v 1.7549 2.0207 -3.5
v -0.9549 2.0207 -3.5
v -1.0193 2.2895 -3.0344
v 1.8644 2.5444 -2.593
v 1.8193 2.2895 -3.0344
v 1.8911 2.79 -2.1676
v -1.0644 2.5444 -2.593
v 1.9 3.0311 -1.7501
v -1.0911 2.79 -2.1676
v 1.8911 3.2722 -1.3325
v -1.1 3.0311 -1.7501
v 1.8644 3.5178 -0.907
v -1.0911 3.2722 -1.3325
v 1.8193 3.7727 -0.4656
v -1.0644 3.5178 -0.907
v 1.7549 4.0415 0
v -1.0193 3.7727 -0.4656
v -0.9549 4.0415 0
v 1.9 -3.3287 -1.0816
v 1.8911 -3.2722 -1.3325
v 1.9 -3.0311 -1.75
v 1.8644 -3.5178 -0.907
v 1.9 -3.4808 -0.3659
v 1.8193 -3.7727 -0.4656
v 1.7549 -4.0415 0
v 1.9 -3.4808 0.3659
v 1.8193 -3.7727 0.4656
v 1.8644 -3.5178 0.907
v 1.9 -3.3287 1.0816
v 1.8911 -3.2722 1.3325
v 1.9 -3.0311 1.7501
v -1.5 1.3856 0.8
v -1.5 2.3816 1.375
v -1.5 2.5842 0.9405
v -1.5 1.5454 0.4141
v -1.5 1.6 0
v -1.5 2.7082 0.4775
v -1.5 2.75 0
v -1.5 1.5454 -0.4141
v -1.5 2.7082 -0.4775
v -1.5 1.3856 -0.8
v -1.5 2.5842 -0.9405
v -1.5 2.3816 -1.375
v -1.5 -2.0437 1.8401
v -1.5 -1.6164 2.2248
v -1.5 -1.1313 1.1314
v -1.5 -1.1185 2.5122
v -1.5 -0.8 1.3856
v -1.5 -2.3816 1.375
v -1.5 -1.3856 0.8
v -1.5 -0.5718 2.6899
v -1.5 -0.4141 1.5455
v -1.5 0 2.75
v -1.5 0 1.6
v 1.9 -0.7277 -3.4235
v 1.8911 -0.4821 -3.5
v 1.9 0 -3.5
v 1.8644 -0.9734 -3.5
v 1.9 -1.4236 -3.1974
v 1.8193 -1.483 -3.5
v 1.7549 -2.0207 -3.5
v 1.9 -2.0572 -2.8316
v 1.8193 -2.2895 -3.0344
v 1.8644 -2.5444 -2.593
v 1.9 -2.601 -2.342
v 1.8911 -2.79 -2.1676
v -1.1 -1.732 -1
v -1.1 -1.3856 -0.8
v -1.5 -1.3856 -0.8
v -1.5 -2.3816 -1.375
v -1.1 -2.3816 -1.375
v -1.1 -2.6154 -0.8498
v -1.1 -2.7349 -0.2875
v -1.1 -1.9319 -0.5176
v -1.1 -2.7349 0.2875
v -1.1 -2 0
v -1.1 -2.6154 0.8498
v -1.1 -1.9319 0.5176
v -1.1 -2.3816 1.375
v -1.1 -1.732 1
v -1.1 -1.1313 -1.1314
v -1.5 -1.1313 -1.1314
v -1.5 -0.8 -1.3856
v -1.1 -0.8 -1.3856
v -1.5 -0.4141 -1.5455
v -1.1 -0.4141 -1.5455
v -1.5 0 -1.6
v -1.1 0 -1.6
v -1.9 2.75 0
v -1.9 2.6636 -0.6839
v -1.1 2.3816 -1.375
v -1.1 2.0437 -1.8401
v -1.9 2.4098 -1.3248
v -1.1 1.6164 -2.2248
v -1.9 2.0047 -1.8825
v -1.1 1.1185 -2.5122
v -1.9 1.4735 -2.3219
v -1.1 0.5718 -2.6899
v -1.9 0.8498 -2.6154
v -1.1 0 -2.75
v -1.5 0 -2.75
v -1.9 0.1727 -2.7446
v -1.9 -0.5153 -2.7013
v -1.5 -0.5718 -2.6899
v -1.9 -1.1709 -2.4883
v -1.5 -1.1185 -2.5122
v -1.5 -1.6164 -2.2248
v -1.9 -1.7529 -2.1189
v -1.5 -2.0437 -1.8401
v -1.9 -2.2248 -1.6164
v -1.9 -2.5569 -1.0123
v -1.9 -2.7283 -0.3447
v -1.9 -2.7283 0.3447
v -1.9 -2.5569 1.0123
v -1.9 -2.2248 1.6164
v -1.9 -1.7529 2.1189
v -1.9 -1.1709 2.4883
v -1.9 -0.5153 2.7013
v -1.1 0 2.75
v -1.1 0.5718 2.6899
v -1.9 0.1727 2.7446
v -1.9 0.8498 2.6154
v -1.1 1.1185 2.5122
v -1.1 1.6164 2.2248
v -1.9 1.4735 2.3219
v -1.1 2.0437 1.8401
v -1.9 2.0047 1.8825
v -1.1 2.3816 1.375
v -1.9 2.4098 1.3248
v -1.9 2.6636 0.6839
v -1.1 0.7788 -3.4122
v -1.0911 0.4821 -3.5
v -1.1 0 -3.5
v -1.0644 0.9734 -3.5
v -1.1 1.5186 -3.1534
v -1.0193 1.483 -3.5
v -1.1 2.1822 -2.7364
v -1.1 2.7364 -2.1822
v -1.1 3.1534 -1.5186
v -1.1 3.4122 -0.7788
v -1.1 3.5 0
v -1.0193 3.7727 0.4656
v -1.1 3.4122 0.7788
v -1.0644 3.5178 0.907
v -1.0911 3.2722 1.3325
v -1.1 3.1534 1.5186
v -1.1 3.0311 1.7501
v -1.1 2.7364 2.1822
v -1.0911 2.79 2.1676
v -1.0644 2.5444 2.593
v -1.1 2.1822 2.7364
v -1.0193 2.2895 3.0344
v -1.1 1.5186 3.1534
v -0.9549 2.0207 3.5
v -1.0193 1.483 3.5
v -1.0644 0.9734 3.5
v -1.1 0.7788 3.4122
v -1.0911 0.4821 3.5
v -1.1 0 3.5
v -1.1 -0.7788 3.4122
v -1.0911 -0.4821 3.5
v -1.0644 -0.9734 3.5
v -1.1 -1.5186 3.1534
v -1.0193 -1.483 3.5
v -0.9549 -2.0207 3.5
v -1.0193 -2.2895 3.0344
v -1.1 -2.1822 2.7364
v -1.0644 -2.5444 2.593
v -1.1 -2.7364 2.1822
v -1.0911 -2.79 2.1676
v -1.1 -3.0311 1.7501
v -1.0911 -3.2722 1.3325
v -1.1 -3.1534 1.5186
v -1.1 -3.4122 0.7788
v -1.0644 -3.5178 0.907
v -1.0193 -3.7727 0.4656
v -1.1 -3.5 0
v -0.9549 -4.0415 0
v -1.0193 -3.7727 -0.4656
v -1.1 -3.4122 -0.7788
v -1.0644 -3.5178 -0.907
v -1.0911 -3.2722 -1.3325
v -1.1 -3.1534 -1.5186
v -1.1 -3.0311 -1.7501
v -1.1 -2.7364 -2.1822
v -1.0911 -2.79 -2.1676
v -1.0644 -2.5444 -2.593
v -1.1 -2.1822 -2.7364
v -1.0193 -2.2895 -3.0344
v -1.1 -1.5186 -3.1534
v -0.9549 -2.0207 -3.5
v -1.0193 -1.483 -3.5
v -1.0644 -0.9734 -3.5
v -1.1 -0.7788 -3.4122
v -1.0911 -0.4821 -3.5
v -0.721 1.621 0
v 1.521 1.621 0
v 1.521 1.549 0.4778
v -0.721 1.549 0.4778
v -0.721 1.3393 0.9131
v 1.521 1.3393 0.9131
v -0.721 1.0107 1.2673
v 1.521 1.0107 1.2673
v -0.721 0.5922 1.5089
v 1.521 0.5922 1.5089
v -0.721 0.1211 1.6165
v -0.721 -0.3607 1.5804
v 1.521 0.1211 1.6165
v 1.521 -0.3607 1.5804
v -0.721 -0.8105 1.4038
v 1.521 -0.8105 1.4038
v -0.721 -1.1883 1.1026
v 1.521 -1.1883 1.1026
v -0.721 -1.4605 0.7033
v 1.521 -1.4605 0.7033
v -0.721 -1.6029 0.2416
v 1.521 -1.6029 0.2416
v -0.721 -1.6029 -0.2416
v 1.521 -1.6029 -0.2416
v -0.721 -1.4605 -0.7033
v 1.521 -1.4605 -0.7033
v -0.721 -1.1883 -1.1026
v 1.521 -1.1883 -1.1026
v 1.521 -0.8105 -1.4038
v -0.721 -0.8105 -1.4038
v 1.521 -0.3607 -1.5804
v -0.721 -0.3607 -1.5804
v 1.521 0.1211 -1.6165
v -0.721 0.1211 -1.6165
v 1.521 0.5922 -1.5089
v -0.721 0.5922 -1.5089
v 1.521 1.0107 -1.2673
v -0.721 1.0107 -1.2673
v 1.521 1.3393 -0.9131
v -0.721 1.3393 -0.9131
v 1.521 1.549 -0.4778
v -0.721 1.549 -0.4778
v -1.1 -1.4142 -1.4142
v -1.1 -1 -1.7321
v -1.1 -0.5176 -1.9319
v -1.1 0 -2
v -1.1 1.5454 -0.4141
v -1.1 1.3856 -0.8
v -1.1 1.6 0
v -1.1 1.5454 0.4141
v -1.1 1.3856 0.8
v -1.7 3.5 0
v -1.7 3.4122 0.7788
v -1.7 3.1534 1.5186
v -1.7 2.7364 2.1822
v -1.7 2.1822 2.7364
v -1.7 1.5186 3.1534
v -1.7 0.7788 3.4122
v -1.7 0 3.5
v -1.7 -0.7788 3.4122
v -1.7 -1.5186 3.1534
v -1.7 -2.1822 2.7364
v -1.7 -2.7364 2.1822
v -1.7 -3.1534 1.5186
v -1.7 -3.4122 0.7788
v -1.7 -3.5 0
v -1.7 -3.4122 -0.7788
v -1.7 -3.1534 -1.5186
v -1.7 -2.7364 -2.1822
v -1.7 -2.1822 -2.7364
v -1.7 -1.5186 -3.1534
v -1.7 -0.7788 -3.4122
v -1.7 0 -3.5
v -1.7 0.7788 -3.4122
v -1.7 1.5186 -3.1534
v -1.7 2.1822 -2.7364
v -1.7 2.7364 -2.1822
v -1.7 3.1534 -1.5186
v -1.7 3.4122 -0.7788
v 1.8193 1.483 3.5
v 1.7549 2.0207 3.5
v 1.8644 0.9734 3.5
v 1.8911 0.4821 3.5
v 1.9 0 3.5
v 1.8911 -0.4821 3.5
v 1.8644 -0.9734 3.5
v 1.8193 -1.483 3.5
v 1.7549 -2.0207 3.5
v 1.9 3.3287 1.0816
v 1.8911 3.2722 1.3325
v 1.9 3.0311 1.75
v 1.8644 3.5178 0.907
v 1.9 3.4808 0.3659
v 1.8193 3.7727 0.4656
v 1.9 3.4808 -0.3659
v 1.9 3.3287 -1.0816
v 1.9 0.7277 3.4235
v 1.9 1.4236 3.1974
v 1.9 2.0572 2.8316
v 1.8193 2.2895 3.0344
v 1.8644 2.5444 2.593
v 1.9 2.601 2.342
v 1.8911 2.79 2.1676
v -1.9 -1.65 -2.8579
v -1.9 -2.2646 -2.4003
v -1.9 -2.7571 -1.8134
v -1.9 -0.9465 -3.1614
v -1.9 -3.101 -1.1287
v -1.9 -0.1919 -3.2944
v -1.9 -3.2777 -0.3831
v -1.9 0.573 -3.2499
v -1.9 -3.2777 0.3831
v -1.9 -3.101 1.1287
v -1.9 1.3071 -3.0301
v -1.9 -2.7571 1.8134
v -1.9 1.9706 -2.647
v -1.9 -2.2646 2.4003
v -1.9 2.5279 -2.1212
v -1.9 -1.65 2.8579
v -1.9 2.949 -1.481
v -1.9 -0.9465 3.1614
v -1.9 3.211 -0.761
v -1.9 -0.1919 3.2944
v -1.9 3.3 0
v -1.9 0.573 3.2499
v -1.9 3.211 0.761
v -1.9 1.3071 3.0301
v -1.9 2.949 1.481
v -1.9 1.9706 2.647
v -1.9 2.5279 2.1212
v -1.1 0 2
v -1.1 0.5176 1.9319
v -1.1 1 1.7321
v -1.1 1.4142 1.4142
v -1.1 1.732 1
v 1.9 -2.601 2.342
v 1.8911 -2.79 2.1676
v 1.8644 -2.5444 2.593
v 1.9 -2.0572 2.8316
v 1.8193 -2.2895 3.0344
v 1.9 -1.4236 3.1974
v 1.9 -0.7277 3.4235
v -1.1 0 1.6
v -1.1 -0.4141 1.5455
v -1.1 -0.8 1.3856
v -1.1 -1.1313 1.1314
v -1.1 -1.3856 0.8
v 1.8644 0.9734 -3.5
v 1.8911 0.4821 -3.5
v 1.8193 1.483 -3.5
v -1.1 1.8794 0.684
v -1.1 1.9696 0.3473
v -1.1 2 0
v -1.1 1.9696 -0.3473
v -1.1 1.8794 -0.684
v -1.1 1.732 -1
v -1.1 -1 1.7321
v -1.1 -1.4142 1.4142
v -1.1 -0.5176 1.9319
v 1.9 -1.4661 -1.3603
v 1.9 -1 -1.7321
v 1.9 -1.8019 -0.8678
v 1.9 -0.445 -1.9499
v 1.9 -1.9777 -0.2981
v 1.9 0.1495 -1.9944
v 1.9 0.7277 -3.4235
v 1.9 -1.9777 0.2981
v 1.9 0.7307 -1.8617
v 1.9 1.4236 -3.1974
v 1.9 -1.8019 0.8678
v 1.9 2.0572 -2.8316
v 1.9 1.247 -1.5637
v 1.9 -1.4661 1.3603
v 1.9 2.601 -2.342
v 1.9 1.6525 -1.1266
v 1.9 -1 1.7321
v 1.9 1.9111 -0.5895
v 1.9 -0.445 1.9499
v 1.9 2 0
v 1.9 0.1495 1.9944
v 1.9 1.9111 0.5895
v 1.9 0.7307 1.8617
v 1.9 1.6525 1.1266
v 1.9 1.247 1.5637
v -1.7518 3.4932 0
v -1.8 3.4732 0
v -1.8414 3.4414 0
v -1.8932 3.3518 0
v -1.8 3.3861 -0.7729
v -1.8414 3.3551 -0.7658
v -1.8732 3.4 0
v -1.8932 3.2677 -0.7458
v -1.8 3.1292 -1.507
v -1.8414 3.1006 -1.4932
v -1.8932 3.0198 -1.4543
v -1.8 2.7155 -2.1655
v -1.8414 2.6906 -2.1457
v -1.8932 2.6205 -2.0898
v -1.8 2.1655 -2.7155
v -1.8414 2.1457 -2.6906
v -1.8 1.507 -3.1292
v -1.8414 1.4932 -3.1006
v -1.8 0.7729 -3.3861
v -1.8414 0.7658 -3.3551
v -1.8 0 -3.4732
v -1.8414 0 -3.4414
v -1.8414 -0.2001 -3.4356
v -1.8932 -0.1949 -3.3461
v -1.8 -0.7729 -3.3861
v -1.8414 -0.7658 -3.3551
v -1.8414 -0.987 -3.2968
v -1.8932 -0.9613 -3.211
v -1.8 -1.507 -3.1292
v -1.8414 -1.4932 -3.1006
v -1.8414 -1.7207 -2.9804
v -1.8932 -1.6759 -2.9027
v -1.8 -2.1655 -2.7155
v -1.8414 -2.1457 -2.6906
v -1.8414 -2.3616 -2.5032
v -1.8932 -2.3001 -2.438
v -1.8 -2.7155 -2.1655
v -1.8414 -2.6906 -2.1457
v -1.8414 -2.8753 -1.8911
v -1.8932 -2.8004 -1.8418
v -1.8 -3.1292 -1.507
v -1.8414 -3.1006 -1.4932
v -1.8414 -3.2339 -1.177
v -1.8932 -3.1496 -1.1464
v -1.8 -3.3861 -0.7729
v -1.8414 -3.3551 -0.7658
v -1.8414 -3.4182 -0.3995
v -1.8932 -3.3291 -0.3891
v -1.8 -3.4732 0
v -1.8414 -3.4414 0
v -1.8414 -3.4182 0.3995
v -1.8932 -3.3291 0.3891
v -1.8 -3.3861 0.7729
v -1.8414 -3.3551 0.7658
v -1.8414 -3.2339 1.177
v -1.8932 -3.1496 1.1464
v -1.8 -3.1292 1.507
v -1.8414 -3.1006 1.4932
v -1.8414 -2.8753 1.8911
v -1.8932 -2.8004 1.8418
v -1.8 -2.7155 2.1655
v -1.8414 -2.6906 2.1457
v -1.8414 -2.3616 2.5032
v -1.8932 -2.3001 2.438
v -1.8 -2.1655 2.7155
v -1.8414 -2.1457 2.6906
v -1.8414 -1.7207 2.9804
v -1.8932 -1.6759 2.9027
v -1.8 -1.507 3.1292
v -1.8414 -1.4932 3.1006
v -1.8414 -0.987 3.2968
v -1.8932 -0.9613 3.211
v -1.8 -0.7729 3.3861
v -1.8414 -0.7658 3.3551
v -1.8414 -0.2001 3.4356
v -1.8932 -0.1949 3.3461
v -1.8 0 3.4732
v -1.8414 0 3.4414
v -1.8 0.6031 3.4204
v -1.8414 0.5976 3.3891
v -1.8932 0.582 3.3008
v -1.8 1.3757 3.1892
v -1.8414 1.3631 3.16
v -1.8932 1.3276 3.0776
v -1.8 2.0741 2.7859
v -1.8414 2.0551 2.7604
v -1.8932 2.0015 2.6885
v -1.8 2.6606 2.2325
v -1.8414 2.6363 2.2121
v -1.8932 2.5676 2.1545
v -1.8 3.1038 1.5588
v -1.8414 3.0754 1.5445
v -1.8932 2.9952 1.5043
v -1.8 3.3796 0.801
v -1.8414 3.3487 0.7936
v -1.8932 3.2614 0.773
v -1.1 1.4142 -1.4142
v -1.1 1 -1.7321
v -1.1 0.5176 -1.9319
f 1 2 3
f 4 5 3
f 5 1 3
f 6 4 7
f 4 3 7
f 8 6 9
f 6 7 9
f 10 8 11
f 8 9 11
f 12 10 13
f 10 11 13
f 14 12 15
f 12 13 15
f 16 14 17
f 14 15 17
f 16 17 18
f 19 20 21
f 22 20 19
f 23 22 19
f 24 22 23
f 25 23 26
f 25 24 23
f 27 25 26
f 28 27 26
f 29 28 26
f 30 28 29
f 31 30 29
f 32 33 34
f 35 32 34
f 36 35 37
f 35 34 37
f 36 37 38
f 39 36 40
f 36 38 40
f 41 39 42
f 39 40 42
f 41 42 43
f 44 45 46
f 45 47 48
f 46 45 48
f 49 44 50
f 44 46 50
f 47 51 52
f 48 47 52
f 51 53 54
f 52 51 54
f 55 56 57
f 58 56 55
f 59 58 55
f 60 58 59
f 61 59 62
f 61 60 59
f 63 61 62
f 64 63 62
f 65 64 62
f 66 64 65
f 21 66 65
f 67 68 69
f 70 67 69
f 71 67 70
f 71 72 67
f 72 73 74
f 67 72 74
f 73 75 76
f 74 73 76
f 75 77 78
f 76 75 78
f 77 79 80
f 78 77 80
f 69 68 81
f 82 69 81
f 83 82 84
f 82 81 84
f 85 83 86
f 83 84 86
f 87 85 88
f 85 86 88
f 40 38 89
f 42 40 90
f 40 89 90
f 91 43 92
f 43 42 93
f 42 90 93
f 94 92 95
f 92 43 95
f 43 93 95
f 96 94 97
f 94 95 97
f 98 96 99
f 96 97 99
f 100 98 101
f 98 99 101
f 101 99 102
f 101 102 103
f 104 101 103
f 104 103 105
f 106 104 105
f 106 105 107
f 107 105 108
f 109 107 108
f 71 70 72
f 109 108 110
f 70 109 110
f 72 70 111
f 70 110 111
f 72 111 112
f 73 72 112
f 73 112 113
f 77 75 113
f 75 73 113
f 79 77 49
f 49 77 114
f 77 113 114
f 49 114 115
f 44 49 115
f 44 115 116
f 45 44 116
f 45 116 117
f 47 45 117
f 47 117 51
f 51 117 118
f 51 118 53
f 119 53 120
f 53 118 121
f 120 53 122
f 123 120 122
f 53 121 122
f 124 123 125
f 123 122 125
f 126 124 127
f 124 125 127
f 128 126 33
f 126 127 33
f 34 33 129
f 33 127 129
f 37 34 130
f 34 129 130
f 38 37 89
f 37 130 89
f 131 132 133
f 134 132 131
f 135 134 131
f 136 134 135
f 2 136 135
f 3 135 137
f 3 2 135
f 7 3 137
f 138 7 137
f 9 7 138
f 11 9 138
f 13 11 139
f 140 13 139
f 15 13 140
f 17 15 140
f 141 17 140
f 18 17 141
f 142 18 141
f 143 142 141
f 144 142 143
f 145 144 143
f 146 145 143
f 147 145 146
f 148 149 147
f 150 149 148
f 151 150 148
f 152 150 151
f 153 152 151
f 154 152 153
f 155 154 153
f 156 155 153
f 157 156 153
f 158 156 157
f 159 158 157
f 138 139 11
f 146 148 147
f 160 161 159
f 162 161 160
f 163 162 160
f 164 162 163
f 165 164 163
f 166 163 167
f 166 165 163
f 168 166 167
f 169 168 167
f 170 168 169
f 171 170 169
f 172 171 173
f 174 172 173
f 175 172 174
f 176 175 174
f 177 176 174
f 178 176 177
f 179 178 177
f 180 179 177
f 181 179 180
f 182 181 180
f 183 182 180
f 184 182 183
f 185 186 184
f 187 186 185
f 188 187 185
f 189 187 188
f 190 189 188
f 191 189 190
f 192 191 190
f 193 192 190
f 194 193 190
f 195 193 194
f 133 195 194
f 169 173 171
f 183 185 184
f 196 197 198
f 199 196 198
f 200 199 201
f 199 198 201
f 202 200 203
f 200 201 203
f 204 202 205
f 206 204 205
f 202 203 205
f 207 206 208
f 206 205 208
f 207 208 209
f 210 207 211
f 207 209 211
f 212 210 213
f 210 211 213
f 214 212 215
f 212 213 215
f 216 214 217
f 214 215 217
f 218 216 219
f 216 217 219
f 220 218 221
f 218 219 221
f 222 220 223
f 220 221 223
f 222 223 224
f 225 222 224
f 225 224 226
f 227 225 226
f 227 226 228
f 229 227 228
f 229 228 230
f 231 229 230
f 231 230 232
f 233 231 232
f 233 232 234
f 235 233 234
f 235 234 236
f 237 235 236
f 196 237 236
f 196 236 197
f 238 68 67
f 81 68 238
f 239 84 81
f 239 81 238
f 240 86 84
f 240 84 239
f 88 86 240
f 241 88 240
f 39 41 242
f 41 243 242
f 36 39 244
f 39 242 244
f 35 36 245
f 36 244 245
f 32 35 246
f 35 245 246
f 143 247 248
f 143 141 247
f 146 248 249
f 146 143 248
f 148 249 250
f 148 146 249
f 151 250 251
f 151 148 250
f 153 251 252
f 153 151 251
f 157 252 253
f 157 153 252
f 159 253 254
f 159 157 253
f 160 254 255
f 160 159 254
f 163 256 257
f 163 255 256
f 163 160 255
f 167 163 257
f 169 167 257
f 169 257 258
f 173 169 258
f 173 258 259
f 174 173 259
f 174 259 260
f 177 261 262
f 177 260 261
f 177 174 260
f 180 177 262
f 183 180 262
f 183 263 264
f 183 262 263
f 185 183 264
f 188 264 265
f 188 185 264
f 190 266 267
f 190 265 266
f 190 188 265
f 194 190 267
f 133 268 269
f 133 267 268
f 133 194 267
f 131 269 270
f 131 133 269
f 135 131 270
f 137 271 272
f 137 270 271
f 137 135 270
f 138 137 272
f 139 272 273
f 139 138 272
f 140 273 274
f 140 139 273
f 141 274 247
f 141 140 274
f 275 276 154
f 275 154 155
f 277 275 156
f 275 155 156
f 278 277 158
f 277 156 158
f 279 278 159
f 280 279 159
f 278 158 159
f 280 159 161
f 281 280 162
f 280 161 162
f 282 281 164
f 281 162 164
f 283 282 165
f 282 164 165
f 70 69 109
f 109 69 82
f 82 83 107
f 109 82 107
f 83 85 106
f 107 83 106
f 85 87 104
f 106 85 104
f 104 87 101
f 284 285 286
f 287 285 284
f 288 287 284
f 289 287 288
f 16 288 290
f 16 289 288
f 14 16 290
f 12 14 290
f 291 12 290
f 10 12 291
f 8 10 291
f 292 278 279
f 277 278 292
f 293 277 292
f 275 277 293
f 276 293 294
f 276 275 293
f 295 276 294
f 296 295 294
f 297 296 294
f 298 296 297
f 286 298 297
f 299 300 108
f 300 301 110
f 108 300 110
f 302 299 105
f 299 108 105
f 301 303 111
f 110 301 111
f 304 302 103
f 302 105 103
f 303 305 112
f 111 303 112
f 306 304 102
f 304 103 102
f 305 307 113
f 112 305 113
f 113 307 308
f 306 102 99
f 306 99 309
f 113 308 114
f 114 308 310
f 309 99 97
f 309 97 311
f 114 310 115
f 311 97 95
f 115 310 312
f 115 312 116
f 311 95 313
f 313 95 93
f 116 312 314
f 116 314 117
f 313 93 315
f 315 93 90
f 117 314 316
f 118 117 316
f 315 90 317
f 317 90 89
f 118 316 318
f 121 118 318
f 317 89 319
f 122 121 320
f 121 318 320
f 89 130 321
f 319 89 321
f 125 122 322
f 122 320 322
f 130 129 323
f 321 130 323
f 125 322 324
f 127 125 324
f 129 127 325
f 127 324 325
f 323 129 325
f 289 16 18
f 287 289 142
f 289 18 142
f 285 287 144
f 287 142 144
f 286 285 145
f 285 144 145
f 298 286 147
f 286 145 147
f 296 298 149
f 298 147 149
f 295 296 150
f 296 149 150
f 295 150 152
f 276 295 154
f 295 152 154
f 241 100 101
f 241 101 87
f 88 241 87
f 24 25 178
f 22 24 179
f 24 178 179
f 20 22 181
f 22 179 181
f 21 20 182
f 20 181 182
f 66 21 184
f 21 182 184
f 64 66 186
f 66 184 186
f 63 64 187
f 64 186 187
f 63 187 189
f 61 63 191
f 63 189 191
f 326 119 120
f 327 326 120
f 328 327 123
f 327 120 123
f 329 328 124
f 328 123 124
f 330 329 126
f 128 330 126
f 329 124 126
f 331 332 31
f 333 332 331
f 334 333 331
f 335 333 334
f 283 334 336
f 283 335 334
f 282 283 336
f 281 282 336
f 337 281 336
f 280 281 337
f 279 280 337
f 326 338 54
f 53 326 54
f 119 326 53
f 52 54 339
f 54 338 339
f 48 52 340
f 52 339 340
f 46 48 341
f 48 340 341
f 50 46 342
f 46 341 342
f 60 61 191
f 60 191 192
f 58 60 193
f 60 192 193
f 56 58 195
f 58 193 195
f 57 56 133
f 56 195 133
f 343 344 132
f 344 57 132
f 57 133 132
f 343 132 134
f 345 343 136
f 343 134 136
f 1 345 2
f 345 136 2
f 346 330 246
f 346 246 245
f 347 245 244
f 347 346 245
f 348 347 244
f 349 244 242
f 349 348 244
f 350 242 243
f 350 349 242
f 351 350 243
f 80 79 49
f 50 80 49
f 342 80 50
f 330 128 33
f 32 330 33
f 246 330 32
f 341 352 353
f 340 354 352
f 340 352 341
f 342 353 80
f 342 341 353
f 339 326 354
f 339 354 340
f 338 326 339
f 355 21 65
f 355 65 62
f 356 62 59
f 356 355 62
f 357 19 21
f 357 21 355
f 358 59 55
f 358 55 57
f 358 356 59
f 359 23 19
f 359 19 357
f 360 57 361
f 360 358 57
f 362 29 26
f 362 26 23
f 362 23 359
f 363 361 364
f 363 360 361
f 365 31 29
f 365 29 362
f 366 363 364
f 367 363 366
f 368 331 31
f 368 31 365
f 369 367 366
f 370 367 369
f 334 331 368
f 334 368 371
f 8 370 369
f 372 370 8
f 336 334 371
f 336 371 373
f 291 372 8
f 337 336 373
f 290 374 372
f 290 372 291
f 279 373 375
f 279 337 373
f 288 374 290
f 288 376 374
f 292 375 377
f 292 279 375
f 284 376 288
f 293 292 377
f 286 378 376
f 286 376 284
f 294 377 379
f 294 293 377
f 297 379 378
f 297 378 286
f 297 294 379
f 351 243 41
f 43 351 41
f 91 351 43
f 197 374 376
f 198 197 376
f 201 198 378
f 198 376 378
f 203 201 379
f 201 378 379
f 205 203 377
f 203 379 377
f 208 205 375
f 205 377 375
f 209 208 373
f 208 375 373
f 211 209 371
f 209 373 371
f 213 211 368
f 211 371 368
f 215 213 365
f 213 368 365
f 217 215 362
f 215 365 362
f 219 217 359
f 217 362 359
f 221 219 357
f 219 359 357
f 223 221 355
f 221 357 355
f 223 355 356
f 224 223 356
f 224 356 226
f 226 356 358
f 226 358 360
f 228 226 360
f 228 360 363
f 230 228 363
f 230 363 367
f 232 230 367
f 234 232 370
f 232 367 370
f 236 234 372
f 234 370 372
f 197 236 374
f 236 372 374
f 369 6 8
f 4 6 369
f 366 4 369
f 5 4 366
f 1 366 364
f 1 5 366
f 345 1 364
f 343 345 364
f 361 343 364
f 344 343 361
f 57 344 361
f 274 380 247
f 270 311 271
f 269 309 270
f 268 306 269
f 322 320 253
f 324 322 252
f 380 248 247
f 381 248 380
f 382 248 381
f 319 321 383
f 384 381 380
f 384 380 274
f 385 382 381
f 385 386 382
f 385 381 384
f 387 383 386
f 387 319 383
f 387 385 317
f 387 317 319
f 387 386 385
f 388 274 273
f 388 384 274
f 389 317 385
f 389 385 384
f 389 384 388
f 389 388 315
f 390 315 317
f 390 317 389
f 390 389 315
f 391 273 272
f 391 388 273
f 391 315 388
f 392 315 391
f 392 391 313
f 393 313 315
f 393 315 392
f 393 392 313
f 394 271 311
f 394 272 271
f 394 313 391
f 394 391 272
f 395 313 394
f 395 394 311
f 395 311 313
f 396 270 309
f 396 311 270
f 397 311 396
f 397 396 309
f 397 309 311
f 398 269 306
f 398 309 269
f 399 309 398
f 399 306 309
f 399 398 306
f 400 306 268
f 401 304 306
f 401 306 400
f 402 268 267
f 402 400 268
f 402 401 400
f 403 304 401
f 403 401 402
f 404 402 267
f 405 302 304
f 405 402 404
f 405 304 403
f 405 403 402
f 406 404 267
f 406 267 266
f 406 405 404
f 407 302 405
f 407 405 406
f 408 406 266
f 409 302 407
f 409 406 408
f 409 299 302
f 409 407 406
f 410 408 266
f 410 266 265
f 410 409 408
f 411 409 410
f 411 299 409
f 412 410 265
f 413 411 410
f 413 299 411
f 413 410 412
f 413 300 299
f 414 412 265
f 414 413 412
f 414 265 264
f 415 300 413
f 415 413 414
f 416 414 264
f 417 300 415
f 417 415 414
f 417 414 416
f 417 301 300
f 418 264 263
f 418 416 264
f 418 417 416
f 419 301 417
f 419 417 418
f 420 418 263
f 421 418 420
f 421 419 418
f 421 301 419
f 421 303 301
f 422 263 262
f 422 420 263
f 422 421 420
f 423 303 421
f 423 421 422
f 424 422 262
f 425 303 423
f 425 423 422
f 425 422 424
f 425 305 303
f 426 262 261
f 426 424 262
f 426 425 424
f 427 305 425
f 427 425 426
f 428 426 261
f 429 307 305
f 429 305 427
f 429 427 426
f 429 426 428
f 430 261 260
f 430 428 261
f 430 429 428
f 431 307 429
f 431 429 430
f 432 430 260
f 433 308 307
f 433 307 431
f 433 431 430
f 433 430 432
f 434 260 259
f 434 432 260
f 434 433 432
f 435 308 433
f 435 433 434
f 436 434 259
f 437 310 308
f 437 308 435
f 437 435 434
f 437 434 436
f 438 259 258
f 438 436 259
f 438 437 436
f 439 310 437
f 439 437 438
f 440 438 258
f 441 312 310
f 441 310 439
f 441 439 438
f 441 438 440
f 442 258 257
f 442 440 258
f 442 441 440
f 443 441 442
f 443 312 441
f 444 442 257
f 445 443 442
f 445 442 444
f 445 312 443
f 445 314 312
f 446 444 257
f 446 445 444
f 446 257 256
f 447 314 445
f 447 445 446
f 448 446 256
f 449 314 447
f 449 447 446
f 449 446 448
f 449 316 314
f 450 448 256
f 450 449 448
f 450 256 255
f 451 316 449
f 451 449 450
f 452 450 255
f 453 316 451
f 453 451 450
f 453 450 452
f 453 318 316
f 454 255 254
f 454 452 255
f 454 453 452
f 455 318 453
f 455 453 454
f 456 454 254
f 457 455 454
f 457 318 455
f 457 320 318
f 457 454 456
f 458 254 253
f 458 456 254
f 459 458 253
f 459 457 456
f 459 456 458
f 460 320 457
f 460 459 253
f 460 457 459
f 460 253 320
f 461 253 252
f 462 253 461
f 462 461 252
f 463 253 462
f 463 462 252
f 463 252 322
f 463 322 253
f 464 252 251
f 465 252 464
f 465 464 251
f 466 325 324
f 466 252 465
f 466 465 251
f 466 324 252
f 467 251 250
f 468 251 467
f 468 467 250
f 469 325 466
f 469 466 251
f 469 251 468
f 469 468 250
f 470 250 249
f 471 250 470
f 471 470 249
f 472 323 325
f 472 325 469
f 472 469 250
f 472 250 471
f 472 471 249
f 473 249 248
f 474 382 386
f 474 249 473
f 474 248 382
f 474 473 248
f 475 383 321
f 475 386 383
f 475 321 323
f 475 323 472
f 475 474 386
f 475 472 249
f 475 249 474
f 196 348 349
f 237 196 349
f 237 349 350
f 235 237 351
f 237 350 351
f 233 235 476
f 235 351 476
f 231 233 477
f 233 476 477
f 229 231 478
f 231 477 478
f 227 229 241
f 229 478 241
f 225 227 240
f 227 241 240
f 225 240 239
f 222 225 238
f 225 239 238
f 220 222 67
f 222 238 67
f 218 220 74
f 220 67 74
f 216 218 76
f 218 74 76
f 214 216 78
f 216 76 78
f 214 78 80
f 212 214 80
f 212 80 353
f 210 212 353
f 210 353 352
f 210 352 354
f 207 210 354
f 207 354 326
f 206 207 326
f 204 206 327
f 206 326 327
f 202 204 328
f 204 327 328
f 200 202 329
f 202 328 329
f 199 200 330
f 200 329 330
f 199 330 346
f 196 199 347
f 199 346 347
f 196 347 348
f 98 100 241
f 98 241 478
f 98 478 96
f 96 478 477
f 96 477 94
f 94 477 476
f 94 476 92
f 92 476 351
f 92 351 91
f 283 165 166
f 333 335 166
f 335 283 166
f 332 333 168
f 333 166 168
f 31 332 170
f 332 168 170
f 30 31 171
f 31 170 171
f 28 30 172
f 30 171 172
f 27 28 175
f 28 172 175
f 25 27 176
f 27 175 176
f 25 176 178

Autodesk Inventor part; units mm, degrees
sketch "Sketch_1" plane through (0, 0, 0) normal (0, 0, 1) x (1, 0, 0)
  line L0 (1.9, 0) -> (-1.1, 0)
  line L1 (-1.1, 0) -> (-1.1, 2.75)
  line L2 (-1.1, 2.75) -> (-1.9, 2.75)
  line L3 (-1.9, 2.75) -> (-1.9, 3.3)
  arc A0 (-1.7, 3.5) -> (-1.9, 3.3) centre (-1.7, 3.3) ccw
  line L4 (-1.7, 3.5) -> (-1.1, 3.5)
  line L5 (-1.1, 3.5) -> (-0.9526, 4.05)
  line L6 (-0.9526, 4.05) -> (1.7526, 4.05)
  line L7 (1.7526, 4.05) -> (1.9, 3.5)
  line L8 (1.9, 3.5) -> (1.9, 0)
  line L9 (1.9, 0) -> (-1.1, 0)
revolve "Revolution1" add sketch "Sketch_1" angle 360 about axis through (1.9, 0, 0) along (1, 0, 0)
sketch "Sketch_2" plane through (0, 0, 0) normal (1, 0, 0) x (0, 1, 0)
  line L0 (7, 7) -> (-7, 7)
  line L1 (-7, 7) -> (-7, -7)
  line L2 (-7, -7) -> (7, -7)
  line L3 (7, -7) -> (7, 7)
  line L4 (-2.0207, 3.5) -> (-4.0415, 0)
  line L5 (-4.0415, 0) -> (-2.0207, -3.5)
  line L6 (-2.0207, -3.5) -> (2.0207, -3.5)
  line L7 (2.0207, -3.5) -> (4.0415, 0)
  line L8 (4.0415, 0) -> (2.0207, 3.5)
  line L9 (2.0207, 3.5) -> (-2.0207, 3.5)
extrude "Extrusion1" cut sketch "Sketch_2" along normal mid plane 3.8
sketch "Sketch_3" plane through (0, 0, 0) normal (0, 0, 1) x (1, 0, 0)
  line L0 (1.9, 0) -> (-1.1, 0)
  line L1 (-1.1, 0) -> (-1.1, 2)
  line L2 (-1.1, 2) -> (-0.721, 1.621)
  line L3 (-0.721, 1.621) -> (1.521, 1.621)
  line L4 (1.521, 1.621) -> (1.9, 2)
  line L5 (1.9, 2) -> (1.9, 0)
  line L6 (1.9, 0) -> (-1.1, 0)
revolve "Revolution2" cut sketch "Sketch_3" angle 360 about axis through (1.9, 0, 0) along (1, 0, 0)
thread "Thread1" size "M4x0.7" class "6H" standard "ISO Metric profile" full length
sketch "Sketch_7" plane through (-1.1, 0, 0) normal (1, 0, 0) x (0, 0, -1)
  line L0 (-1.375, 2.3816) -> (-0.8, 1.3856)
  arc A0 (0.8, 1.3856) -> (-0.8, 1.3856) centre (0, 0) ccw
  line L1 (0.8, 1.3856) -> (1.375, 2.3816)
  arc A1 (1.375, 2.3816) -> (-1.375, 2.3816) centre (0, 0) ccw
extrude "Extrusion2" add sketch "Sketch_7" against normal blind 0.4
sketch "Sketch_9" plane through (-1.1, 0, 0) normal (1, 0, 0) x (0, 0, -1)
  arc A0 (-2.75, 0) -> (-1.375, -2.3816) centre (0, 0) ccw
  line L0 (-1.375, -2.3816) -> (-0.8, -1.3856)
  arc A1 (-1.6, 0) -> (-0.8, -1.3856) centre (0, 0) ccw
  line L1 (-1.6, 0) -> (-2.75, 0)
extrude "Extrusion3" add sketch "Sketch_9" against normal blind 0.4
sketch "Sketch_8" plane through (-1.1, 0, 0) normal (1, 0, 0) x (0, 0, -1)
  line L0 (0.8, -1.3856) -> (1.375, -2.3816)
  arc A0 (1.375, -2.3816) -> (2.75, 0) centre (0, 0) ccw
  line L1 (2.75, 0) -> (1.6, 0)
  arc A1 (0.8, -1.3856) -> (1.6, 0) centre (0, 0) ccw
extrude "Extrusion4" add sketch "Sketch_8" against normal blind 0.4
ref_plane "to_bolt_XY" through (1.9, 0, 0) normal (1, 0, 0) x (0, 0, -1)
ref_plane "to_bolt_YZ" through (1.9, 0, 0) normal (0, 0, -1) x (0, 1, 0)
ref_plane "to_bolt_ZX" through (1.9, 0, 0) normal (0, 1, 0) x (1, 0, 0)
properties part number "UNUTZ4"
